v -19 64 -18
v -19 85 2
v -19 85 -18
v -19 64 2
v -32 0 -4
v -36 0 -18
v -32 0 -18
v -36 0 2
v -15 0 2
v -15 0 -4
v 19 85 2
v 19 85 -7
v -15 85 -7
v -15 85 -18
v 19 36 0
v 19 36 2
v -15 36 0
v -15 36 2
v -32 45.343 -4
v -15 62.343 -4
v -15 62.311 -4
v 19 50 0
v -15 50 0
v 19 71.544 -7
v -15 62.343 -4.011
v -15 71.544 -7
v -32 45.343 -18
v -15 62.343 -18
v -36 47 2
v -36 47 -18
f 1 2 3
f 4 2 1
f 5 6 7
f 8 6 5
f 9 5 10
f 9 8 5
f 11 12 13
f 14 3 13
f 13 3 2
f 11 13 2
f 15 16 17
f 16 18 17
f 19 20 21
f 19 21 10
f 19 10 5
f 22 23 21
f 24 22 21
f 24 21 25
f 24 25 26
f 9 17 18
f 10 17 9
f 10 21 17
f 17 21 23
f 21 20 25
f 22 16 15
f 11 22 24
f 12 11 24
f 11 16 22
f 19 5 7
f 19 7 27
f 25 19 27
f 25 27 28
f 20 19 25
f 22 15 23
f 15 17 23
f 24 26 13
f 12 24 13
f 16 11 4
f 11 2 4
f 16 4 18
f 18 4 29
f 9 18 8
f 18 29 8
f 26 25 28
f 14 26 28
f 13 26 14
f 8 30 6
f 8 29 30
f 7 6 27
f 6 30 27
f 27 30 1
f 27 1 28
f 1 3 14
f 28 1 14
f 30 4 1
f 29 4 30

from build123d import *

# Parameters (mm, degrees)
BOSS_EXTRUDE1_DEPTH = 2
BOSS_EXTRUDE2_DEPTH = 30
SKETCH3_W           = 15
SKETCH3_H           = 50
BOSS_EXTRUDE3_DEPTH = 4
BOSS_EXTRUDE4_DEPTH = 6
BOSS_EXTRUDE5_DEPTH = 14
CUT_EXTRUDE1_DEPTH  = 26
BOSS_EXTRUDE6_DEPTH = 4


with BuildPart() as part:
    # Sketch1 → Boss-Extrude1 (new body)
    with BuildSketch(Plane.XY):
        Polygon((-15, 0), (-15, 36), (15, 36), (15, 50), (15, 111), (-15, 111), (-15, 50), (-30, 50), (-30, 0), align=None)
    extrude(amount=BOSS_EXTRUDE1_DEPTH)

    # Sketch2 → Boss-Extrude2 (add)
    with BuildSketch(Plane(origin=(15, 0, 0), x_dir=(0, 0, -1), z_dir=(1, 0, 0))):
        Polygon((0, 50), (7, 71.54378476), (7, 111), (0, 111), align=None)
    extrude(amount=-BOSS_EXTRUDE2_DEPTH)

    # Sketch3 → Boss-Extrude3 (add)
    with BuildSketch(Plane(origin=(0, 0, 0), x_dir=(-1, 0, 0), z_dir=(0, 0, -1))):
        with Locations((22.5, 25)):
            Rectangle(SKETCH3_W, SKETCH3_H)
    extrude(amount=BOSS_EXTRUDE3_DEPTH)

    # Sketch4 → Boss-Extrude4 (add)
    with BuildSketch(Plane(origin=(0, 0, -4), x_dir=(-1, 0, 0), z_dir=(0, 0, -1))):
        Polygon((15, 111), (15, 50), (30, 50), (30, 0), (36, 0), (36, 47), (19, 64), (19, 111), align=None)
    extrude(amount=-BOSS_EXTRUDE4_DEPTH)

    # Sketch5 → Boss-Extrude5 (add)
    with BuildSketch(Plane(origin=(0, 0, -4), x_dir=(-1, 0, 0), z_dir=(0, 0, -1))):
        Polygon((32, 0), (32, 45.343145751), (15, 62.343145751), (15, 111), (19, 111), (19, 64), (36, 47), (36, 0), align=None)
    extrude(amount=BOSS_EXTRUDE5_DEPTH)

    # Sketch6 → Cut-Extrude1 (cut)
    with BuildSketch(Plane(origin=(0, 111, 0), x_dir=(1, 0, 0), z_dir=(0, 1, 0))):
        Polygon((15, 7), (-15, 7), (-15, 18), (-19, 18), (-19, -2), (15, -2), align=None)
    extrude(amount=-CUT_EXTRUDE1_DEPTH, mode=Mode.SUBTRACT)

    # Sketch7 → Boss-Extrude6 (add)
    with BuildSketch(Plane(origin=(15, 0, 0), x_dir=(0, 0, -1), z_dir=(1, 0, 0))):
        Polygon((7, 85), (-2, 85), (-2, 36), (0, 36), (0, 50), (7, 71.54378476), align=None)
    extrude(amount=BOSS_EXTRUDE6_DEPTH)


solid = part.part
